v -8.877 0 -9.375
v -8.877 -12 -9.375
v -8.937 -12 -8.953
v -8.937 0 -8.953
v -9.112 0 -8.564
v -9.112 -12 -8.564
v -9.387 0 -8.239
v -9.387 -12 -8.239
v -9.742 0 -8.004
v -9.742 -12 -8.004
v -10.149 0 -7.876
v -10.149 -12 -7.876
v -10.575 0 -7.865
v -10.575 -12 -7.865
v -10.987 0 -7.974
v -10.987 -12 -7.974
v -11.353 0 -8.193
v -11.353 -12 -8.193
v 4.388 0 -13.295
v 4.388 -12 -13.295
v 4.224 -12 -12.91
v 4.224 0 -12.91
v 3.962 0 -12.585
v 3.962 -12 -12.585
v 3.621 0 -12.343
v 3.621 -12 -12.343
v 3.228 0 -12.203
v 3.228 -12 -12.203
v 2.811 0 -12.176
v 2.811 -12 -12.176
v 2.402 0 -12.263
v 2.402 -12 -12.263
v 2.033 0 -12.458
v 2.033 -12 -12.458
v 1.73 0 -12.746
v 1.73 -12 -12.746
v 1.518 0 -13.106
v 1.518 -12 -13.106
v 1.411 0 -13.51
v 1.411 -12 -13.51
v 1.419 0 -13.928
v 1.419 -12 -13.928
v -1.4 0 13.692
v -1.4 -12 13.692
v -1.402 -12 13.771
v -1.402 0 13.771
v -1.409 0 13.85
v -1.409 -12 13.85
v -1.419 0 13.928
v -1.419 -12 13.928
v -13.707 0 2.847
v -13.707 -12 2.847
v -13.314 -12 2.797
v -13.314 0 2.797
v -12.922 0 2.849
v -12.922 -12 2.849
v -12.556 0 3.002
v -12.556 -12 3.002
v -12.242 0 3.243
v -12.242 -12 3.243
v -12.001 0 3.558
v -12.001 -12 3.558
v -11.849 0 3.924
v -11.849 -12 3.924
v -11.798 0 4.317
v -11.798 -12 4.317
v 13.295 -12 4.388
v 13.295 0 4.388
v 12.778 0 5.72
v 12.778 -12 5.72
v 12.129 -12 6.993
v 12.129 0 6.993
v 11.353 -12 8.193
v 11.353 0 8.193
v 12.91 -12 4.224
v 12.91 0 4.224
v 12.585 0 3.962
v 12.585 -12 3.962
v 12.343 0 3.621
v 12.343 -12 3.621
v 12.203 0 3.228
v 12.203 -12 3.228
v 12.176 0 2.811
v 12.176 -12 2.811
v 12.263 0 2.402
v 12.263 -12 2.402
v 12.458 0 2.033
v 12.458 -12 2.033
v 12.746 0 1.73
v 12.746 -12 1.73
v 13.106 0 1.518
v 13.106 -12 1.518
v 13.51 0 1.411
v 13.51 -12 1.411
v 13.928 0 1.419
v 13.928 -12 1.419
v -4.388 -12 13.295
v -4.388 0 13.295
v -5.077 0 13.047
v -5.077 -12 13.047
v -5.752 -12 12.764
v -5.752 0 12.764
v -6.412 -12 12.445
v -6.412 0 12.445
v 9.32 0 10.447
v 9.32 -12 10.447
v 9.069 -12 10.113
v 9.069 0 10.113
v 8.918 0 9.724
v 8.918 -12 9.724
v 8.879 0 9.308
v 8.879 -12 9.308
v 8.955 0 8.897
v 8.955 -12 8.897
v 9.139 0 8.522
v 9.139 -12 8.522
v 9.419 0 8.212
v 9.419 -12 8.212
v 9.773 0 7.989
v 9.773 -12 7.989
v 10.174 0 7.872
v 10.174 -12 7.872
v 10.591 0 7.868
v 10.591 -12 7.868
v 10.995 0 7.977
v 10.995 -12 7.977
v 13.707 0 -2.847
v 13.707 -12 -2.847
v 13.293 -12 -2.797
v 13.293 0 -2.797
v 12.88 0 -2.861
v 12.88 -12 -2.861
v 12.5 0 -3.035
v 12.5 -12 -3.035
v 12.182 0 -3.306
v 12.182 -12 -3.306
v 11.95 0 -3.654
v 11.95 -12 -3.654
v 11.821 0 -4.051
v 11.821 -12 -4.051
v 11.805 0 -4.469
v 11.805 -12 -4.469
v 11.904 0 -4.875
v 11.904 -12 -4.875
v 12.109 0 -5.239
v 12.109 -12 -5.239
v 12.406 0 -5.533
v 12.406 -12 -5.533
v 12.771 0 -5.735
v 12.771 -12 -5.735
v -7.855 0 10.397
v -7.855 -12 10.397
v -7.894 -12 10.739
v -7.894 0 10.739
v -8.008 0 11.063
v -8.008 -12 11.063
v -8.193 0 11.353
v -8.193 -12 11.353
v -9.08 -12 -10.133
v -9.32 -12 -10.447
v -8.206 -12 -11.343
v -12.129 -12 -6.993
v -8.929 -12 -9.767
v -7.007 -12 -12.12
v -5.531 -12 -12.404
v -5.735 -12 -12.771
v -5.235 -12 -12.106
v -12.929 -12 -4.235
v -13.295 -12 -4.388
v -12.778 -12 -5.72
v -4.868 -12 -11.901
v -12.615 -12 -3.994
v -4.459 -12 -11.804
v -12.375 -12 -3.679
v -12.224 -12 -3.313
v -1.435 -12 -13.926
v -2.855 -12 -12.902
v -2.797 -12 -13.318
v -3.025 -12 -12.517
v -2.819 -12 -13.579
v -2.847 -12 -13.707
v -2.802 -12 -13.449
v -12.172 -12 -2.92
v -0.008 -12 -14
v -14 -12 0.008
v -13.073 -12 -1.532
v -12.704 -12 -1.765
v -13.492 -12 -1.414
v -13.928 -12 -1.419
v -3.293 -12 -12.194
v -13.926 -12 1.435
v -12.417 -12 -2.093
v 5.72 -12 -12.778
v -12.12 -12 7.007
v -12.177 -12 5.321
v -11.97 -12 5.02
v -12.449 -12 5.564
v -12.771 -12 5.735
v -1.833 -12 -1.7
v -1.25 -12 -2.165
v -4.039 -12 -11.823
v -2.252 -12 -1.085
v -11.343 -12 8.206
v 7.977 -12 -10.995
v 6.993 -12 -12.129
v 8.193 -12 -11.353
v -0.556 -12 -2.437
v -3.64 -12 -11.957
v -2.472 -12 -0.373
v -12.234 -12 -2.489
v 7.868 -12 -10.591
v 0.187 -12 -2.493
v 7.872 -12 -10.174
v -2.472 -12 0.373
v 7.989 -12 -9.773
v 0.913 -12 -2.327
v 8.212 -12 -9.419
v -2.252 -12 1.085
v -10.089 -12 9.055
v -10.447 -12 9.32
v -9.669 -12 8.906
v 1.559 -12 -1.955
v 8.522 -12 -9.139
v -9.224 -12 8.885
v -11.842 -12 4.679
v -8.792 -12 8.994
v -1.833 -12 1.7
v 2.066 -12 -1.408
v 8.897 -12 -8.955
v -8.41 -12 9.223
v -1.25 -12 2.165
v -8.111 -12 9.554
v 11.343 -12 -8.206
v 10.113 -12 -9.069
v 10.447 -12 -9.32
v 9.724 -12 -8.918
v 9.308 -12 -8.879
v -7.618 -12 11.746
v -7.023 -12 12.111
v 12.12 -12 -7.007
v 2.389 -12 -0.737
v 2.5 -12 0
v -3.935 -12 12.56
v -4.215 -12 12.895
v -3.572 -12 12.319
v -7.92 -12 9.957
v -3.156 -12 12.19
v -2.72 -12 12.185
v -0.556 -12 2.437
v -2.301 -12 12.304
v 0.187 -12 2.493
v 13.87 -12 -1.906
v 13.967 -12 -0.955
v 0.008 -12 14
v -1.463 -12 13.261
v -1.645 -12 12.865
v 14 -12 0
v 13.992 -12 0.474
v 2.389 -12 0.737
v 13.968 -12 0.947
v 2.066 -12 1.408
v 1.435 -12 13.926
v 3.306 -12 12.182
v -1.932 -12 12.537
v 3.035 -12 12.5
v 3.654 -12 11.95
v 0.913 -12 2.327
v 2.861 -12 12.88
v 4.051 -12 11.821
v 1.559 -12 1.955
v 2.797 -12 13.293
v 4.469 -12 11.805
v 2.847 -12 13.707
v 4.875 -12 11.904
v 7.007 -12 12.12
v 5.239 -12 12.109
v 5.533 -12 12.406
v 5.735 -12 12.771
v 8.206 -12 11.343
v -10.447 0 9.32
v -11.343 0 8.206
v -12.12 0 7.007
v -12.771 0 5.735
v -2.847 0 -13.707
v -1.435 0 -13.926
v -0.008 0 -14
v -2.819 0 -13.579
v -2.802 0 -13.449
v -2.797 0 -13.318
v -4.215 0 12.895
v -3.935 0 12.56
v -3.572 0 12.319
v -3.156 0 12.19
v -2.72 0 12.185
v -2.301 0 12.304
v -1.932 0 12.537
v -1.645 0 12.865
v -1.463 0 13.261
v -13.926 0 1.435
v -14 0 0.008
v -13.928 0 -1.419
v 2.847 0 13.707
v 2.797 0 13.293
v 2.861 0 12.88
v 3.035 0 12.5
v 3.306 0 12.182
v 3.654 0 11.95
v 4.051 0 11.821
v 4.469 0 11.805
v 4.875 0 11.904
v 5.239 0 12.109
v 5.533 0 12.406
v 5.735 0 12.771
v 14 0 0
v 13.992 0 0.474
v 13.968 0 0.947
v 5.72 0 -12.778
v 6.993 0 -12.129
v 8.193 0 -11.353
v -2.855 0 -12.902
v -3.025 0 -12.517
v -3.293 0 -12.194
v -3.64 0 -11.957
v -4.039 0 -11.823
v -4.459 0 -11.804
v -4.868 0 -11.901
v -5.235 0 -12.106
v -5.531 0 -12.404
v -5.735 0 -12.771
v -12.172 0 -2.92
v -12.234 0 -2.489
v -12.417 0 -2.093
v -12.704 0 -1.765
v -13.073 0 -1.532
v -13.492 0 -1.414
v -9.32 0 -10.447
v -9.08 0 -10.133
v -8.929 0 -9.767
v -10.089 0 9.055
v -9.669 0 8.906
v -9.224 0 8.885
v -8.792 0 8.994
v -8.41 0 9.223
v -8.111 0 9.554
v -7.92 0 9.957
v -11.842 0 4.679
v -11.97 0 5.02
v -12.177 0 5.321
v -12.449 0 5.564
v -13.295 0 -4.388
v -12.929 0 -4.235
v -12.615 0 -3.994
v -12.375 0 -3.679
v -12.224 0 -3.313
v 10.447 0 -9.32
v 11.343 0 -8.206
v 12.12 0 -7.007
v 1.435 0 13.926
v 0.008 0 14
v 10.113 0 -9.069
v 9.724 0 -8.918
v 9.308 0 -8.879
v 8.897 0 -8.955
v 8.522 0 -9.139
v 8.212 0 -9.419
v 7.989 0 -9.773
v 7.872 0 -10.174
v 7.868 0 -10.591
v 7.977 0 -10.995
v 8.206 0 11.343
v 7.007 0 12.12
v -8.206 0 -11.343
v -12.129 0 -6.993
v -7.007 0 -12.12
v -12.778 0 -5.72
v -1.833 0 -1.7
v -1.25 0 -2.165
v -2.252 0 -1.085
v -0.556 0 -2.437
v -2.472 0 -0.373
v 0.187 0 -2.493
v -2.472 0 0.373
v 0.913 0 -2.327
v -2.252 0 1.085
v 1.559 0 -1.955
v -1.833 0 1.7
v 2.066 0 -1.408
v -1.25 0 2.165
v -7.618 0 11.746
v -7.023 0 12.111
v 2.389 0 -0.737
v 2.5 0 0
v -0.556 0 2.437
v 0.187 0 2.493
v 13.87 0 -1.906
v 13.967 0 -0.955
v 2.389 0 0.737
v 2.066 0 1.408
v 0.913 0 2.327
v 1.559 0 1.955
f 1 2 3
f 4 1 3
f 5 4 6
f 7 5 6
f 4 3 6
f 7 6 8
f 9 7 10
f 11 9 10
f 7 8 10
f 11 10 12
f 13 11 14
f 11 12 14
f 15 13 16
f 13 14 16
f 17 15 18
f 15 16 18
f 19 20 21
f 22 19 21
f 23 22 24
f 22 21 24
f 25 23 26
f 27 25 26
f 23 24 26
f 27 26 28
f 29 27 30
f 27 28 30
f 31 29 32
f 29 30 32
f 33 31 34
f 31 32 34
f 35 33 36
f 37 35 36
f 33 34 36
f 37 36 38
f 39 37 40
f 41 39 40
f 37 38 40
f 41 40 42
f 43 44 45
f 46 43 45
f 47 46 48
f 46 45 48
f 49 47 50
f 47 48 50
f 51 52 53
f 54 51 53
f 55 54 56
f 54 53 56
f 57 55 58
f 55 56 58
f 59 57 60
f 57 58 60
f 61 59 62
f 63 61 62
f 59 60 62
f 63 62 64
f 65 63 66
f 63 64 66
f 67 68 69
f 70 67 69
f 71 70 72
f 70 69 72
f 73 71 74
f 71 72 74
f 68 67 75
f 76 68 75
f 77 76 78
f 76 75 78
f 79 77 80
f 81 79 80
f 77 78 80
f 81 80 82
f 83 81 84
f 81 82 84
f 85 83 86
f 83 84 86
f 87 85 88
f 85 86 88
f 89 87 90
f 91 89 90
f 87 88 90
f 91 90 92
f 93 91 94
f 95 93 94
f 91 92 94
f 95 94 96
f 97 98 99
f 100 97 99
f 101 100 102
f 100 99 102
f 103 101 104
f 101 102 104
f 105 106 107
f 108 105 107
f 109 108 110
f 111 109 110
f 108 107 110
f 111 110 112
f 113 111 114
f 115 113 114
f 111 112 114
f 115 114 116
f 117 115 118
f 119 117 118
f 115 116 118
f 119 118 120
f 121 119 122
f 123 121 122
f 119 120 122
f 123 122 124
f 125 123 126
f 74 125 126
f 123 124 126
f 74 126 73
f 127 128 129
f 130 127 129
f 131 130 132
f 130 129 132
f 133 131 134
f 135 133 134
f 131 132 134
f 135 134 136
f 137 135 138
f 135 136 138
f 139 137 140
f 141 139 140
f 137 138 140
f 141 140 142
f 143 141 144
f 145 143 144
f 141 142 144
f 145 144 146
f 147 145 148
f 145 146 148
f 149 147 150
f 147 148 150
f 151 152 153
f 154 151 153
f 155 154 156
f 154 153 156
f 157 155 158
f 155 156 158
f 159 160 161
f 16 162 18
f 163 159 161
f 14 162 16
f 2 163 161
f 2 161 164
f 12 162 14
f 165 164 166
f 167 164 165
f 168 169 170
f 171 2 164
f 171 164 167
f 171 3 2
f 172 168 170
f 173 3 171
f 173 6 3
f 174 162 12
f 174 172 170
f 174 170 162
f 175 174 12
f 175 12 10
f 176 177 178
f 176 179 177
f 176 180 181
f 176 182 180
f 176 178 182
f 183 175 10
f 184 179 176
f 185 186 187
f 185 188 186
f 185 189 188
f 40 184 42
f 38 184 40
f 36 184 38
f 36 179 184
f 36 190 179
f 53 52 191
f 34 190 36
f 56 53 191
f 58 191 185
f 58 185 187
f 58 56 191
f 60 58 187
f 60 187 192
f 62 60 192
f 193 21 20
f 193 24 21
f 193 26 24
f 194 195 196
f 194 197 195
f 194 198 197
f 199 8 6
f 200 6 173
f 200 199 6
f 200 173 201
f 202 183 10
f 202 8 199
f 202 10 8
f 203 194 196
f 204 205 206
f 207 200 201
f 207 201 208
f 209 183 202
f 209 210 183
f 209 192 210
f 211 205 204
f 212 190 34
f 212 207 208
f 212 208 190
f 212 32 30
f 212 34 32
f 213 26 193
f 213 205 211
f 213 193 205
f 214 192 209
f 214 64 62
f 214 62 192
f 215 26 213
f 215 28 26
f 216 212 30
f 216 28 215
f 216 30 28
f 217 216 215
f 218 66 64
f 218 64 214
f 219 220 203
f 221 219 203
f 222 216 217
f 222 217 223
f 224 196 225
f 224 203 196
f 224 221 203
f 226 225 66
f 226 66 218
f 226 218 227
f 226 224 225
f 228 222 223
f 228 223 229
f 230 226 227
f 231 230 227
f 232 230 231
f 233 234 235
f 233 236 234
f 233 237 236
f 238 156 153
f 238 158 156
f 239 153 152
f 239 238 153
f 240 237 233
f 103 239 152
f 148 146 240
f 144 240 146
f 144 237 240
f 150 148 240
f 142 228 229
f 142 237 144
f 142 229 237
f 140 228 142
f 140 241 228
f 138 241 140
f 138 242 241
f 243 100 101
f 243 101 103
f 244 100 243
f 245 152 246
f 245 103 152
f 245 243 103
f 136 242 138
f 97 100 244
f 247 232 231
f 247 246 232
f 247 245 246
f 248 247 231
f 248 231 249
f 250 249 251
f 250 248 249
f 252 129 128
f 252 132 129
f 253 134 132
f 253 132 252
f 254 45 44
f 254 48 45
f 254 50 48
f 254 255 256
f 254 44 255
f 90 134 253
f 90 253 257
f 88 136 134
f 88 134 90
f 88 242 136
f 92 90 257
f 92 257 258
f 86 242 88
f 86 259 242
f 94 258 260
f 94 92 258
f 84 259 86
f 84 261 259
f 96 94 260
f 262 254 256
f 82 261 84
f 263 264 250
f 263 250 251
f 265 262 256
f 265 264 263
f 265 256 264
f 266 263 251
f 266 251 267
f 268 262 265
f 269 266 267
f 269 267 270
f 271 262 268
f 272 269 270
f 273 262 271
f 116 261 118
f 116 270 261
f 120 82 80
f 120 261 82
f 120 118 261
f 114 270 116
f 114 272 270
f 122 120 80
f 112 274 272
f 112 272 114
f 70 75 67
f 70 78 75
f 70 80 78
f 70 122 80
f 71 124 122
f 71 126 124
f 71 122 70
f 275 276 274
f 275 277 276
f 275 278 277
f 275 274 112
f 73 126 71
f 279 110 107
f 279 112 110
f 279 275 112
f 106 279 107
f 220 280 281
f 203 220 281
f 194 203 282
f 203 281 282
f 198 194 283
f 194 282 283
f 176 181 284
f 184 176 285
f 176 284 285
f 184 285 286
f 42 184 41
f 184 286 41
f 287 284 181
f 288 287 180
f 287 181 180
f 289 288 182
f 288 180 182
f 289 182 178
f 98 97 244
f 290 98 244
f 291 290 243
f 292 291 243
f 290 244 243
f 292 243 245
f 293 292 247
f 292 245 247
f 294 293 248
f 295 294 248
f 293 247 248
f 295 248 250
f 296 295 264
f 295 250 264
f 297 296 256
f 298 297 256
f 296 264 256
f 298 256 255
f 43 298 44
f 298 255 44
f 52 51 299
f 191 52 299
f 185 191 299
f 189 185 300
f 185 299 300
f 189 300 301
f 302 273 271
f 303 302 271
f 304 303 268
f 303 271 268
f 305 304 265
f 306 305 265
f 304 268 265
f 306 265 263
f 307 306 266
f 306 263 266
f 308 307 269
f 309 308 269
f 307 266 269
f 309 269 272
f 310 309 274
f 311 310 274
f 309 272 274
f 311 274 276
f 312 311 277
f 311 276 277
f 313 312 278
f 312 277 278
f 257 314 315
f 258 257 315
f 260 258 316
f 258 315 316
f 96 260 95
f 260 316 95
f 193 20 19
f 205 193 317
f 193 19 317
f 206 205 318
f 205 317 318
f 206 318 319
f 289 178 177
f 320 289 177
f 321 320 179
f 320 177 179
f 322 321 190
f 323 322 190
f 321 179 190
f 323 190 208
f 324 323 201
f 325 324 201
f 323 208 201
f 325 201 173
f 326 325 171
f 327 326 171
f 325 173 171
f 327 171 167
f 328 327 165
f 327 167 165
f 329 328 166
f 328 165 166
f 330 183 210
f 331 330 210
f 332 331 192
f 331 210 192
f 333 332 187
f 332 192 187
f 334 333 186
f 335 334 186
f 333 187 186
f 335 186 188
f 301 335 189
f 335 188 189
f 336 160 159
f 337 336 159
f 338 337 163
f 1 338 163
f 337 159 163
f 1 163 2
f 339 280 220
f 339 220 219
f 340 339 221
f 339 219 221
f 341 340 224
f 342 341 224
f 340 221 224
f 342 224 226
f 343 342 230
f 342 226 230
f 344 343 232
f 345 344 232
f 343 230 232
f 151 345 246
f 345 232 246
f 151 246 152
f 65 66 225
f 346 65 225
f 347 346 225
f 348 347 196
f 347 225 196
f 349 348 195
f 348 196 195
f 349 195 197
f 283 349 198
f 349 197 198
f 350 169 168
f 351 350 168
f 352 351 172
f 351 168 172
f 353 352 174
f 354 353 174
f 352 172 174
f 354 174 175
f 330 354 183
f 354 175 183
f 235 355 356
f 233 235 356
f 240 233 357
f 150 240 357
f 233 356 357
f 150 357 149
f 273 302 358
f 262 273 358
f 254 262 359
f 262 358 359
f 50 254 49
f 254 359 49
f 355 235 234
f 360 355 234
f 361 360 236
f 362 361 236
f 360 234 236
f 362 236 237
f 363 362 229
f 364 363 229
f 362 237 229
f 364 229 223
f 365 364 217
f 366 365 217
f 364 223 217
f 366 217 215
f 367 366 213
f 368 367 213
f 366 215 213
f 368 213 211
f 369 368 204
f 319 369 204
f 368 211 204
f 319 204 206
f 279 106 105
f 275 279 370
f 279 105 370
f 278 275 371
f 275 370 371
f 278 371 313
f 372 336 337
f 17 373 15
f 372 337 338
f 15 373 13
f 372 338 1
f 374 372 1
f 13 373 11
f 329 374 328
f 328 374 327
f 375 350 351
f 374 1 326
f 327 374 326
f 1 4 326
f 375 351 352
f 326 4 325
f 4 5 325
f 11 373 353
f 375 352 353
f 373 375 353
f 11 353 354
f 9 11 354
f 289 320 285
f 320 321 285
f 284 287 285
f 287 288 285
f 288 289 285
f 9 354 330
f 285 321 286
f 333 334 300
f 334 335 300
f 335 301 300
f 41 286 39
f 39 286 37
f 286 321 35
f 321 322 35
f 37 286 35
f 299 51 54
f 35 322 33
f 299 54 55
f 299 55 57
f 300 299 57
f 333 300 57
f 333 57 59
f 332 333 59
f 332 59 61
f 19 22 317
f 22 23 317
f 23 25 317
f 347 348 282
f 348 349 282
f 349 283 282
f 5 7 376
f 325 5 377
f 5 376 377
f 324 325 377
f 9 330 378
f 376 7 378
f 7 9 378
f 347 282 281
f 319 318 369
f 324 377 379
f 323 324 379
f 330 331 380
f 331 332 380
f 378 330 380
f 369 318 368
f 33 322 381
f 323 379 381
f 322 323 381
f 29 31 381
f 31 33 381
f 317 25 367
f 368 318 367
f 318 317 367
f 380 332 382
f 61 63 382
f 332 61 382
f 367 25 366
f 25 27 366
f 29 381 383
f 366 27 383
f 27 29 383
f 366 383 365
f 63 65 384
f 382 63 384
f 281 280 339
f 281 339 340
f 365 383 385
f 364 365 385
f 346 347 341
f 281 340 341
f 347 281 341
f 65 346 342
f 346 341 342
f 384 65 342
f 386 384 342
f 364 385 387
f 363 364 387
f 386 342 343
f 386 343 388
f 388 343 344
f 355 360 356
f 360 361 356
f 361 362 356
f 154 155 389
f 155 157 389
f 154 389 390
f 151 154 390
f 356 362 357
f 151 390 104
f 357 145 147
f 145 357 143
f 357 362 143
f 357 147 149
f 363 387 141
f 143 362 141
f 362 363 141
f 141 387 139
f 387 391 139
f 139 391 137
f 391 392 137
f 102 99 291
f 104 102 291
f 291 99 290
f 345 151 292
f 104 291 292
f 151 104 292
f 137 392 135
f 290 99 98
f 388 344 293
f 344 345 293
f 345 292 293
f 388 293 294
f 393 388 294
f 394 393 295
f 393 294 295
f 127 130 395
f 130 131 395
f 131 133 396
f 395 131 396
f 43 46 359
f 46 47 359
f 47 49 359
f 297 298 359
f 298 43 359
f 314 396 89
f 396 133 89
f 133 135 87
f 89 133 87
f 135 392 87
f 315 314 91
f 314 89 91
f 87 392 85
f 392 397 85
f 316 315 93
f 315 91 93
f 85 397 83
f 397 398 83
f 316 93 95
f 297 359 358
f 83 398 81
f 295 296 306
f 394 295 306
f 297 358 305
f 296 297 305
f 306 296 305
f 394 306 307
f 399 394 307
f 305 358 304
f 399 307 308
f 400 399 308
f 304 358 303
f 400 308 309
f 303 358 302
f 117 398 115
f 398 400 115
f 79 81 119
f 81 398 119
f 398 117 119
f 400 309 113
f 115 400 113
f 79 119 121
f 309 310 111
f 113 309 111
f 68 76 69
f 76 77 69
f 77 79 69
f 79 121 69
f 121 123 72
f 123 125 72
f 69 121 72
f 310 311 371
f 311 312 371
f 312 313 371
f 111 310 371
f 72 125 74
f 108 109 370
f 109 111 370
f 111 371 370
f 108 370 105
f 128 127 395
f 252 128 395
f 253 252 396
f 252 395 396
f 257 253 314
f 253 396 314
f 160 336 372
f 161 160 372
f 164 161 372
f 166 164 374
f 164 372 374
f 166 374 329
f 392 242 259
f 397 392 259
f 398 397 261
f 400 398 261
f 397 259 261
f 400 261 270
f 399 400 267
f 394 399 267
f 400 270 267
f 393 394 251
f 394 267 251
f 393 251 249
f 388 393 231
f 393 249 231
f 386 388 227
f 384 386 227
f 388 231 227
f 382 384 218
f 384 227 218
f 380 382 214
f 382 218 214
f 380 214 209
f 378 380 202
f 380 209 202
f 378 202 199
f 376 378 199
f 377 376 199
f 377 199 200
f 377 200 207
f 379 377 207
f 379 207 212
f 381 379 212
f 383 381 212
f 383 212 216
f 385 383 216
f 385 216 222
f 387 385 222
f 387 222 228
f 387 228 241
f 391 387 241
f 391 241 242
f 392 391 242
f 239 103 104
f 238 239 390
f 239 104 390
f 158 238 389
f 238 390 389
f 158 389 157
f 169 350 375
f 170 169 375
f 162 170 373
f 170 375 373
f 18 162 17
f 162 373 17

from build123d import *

# Parameters (mm, degrees)
F1_DEPTH = 12
F3_DEPTH = 25
F5_D     = 5


with BuildPart() as f1:
    # F0 (on Front) → F1 (new body)
    with BuildSketch(Plane.XZ):
        with BuildLine():
            ThreePointArc((-6.1837801054, 11.6114190374), (-6.2418651063, 12.0437074429), (-6.411999761, 12.4453308138))
            ThreePointArc((-6.411999761, 12.4453308138), (-7.8214415512, 11.6114190374), (-9.1238598826, 10.6186242444))
            ThreePointArc((-9.1238598826, 10.6186242444), (-7.2975070499, 10.0598302873), (-6.1837801054, 11.6114190374))
        make_face()
        with BuildLine():
            ThreePointArc((-9.1238598826, 10.6186242444), (-5.8423437781, -12.7226970088), (14, 0))
            ThreePointArc((14, 0), (7.2880725623, 11.9534094854), (-6.411999761, 12.4453308138))
            ThreePointArc((-6.411999761, 12.4453308138), (-6.2418651063, 12.0437074429), (-6.1837801054, 11.6114190374))
            ThreePointArc((-6.1837801054, 11.6114190374), (-7.2975070499, 10.0598302873), (-9.1238598826, 10.6186242444))
        make_face()
    extrude(amount=F1_DEPTH)

    # F2 (on face) → F3 (cut)
    with BuildSketch(Plane.XZ.offset(12)):
        with BuildLine():
            ThreePointArc((-10.4471785382, 9.3196813567), (-8.7916106337, 8.9938043215), (-7.8551114747, 10.3973962329))
            ThreePointArc((-7.8551114747, 10.3973962329), (-7.9419845398, 10.903914247), (-8.1926740651, 11.3525367942))
            ThreePointArc((-8.1926740651, 11.3525367942), (-9.3751880821, 10.3973962329), (-10.4471785382, 9.3196813567))
        make_face()
        with BuildLine():
            ThreePointArc((-10.4471785382, 9.3196813567), (-9.3751880821, 10.3973962329), (-8.1926740651, 11.3525367942))
            ThreePointArc((-8.1926740651, 11.3525367942), (-10.393116946, 11.5263132895), (-10.4471785382, 9.3196813567))
        make_face()
        with BuildLine():
            ThreePointArc((-1.4187954682, 13.9279222937), (-2.9204529279, 13.692003312), (-4.3876813336, 13.2946700792))
            ThreePointArc((-4.3876813336, 13.2946700792), (-2.720036717, 12.1851966772), (-1.4003763205, 13.692003312))
            ThreePointArc((-1.4003763205, 13.692003312), (-1.4049881033, 13.810321771), (-1.4187954682, 13.9279222937))
        make_face()
        with BuildLine():
            ThreePointArc((-1.4187954682, 13.9279222937), (-3.237546655, 15.1786385936), (-4.3876813336, 13.2946700792))
            ThreePointArc((-4.3876813336, 13.2946700792), (-2.9204529279, 13.692003312), (-1.4187954682, 13.9279222937))
        make_face()
        with BuildLine():
            ThreePointArc((-13.7073626903, 2.847491541), (-13.3178491608, 4.3168152299), (-12.7713322624, 5.7352482286))
            ThreePointArc((-12.7713322624, 5.7352482286), (-14.7638599444, 4.7855216477), (-13.7073626903, 2.847491541))
        make_face()
        with BuildLine():
            ThreePointArc((-11.7977725535, 4.3168152299), (-12.0645773537, 5.1770144334), (-12.7713322624, 5.7352482286))
            ThreePointArc((-12.7713322624, 5.7352482286), (-13.3178491608, 4.3168152299), (-13.7073626903, 2.847491541))
            ThreePointArc((-13.7073626903, 2.847491541), (-12.3908803135, 3.112090511), (-11.7977725535, 4.3168152299))
        make_face()
        with BuildLine():
            ThreePointArc((5.7352482286, 12.7713322624), (4.3168152299, 13.3178491608), (2.847491541, 13.7073626903))
            ThreePointArc((2.847491541, 13.7073626903), (3.8481088121, 11.8718383773), (5.7352482286, 12.7713322624))
        make_face()
        with BuildLine():
            ThreePointArc((5.8368918373, 13.3178491608), (4.5132182902, 14.825184137), (2.847491541, 13.7073626903))
            ThreePointArc((2.847491541, 13.7073626903), (4.3168152299, 13.3178491608), (5.7352482286, 12.7713322624))
            ThreePointArc((5.7352482286, 12.7713322624), (5.8112649134, 13.0399048573), (5.8368918373, 13.3178491608))
        make_face()
        with BuildLine():
            ThreePointArc((-12.1719267046, -2.9204529279), (-12.7040716425, -1.7651936891), (-13.9279222937, -1.4187954682))
            ThreePointArc((-13.9279222937, -1.4187954682), (-13.692003312, -2.9204529279), (-13.2946700792, -4.3876813336))
            ThreePointArc((-13.2946700792, -4.3876813336), (-12.4848144608, -3.8442104556), (-12.1719267046, -2.9204529279))
        make_face()
        with BuildLine():
            ThreePointArc((11.3525367942, 8.1926740651), (10.3973962329, 9.3751880821), (9.3196813567, 10.4471785382))
            ThreePointArc((9.3196813567, 10.4471785382), (9.2684791764, 8.3572592183), (11.3525367942, 8.1926740651))
        make_face()
        with BuildLine():
            ThreePointArc((11.9174728403, 9.3751880821), (10.9772340204, 10.7803290119), (9.3196813567, 10.4471785382))
            ThreePointArc((9.3196813567, 10.4471785382), (10.3973962329, 9.3751880821), (11.3525367942, 8.1926740651))
            ThreePointArc((11.3525367942, 8.1926740651), (11.7689864991, 8.719922461), (11.9174728403, 9.3751880821))
        make_face()
        with BuildLine():
            ThreePointArc((-8.8773196255, -9.3751880821), (-9.7421306118, -8.003597816), (-11.3525367942, -8.1926740651))
            ThreePointArc((-11.3525367942, -8.1926740651), (-10.3973962329, -9.3751880821), (-9.3196813567, -10.4471785382))
            ThreePointArc((-9.3196813567, -10.4471785382), (-8.9922553032, -9.9550258696), (-8.8773196255, -9.3751880821))
        make_face()
        with BuildLine():
            ThreePointArc((13.9279222937, 1.4187954682), (13.692003312, 2.9204529279), (13.2946700792, 4.3876813336))
            ThreePointArc((13.2946700792, 4.3876813336), (12.2053680304, 2.6033592009), (13.9279222937, 1.4187954682))
        make_face()
        with BuildLine():
            ThreePointArc((15.2120799194, 2.9204529279), (14.6157608397, 4.1276417791), (13.2946700792, 4.3876813336))
            ThreePointArc((13.2946700792, 4.3876813336), (13.692003312, 2.9204529279), (13.9279222937, 1.4187954682))
            ThreePointArc((13.9279222937, 1.4187954682), (14.8472625508, 1.9325212585), (15.2120799194, 2.9204529279))
        make_face()
        with BuildLine():
            ThreePointArc((-2.7967386225, -13.3178491608), (-4.0388709263, -11.8233994774), (-5.7352482286, -12.7713322624))
            ThreePointArc((-5.7352482286, -12.7713322624), (-4.3168152299, -13.3178491608), (-2.847491541, -13.7073626903))
            ThreePointArc((-2.847491541, -13.7073626903), (-2.8094802537, -13.5142522211), (-2.7967386225, -13.3178491608))
        make_face()
        with BuildLine():
            ThreePointArc((4.3876813336, -13.2946700792), (2.9204529279, -13.692003312), (1.4187954682, -13.9279222937))
            ThreePointArc((1.4187954682, -13.9279222937), (3.0387713869, -15.2074681366), (4.4405295353, -13.692003312))
            ThreePointArc((4.4405295353, -13.692003312), (4.4272595627, -13.4915871011), (4.3876813336, -13.2946700792))
        make_face()
        with BuildLine():
            ThreePointArc((4.3876813336, -13.2946700792), (2.6033592009, -12.2053680304), (1.4187954682, -13.9279222937))
            ThreePointArc((1.4187954682, -13.9279222937), (2.9204529279, -13.692003312), (4.3876813336, -13.2946700792))
        make_face()
        with BuildLine():
            ThreePointArc((12.7713322624, -5.7352482286), (13.3178491608, -4.3168152299), (13.7073626903, -2.847491541))
            ThreePointArc((13.7073626903, -2.847491541), (11.8718383773, -3.8481088121), (12.7713322624, -5.7352482286))
        make_face()
        with BuildLine():
            ThreePointArc((14.8379257682, -4.3168152299), (14.5225738798, -3.3898463825), (13.7073626903, -2.847491541))
            ThreePointArc((13.7073626903, -2.847491541), (13.3178491608, -4.3168152299), (12.7713322624, -5.7352482286))
            ThreePointArc((12.7713322624, -5.7352482286), (14.1780483644, -5.570087037), (14.8379257682, -4.3168152299))
        make_face()
        with BuildLine():
            ThreePointArc((10.4471785382, -9.3196813567), (8.3572592183, -9.2684791764), (8.1926740651, -11.3525367942))
            ThreePointArc((8.1926740651, -11.3525367942), (9.3751880821, -10.3973962329), (10.4471785382, -9.3196813567))
        make_face()
    extrude(amount=-F3_DEPTH, mode=Mode.SUBTRACT)

    # F5 (through all)
    with Locations(Plane(origin=(0, 0, 0), x_dir=(-1, 0, 0), z_dir=(0, 1, 0))):
        with Locations((0, 0)):
            Hole(F5_D / 2)


solid = f1.part
